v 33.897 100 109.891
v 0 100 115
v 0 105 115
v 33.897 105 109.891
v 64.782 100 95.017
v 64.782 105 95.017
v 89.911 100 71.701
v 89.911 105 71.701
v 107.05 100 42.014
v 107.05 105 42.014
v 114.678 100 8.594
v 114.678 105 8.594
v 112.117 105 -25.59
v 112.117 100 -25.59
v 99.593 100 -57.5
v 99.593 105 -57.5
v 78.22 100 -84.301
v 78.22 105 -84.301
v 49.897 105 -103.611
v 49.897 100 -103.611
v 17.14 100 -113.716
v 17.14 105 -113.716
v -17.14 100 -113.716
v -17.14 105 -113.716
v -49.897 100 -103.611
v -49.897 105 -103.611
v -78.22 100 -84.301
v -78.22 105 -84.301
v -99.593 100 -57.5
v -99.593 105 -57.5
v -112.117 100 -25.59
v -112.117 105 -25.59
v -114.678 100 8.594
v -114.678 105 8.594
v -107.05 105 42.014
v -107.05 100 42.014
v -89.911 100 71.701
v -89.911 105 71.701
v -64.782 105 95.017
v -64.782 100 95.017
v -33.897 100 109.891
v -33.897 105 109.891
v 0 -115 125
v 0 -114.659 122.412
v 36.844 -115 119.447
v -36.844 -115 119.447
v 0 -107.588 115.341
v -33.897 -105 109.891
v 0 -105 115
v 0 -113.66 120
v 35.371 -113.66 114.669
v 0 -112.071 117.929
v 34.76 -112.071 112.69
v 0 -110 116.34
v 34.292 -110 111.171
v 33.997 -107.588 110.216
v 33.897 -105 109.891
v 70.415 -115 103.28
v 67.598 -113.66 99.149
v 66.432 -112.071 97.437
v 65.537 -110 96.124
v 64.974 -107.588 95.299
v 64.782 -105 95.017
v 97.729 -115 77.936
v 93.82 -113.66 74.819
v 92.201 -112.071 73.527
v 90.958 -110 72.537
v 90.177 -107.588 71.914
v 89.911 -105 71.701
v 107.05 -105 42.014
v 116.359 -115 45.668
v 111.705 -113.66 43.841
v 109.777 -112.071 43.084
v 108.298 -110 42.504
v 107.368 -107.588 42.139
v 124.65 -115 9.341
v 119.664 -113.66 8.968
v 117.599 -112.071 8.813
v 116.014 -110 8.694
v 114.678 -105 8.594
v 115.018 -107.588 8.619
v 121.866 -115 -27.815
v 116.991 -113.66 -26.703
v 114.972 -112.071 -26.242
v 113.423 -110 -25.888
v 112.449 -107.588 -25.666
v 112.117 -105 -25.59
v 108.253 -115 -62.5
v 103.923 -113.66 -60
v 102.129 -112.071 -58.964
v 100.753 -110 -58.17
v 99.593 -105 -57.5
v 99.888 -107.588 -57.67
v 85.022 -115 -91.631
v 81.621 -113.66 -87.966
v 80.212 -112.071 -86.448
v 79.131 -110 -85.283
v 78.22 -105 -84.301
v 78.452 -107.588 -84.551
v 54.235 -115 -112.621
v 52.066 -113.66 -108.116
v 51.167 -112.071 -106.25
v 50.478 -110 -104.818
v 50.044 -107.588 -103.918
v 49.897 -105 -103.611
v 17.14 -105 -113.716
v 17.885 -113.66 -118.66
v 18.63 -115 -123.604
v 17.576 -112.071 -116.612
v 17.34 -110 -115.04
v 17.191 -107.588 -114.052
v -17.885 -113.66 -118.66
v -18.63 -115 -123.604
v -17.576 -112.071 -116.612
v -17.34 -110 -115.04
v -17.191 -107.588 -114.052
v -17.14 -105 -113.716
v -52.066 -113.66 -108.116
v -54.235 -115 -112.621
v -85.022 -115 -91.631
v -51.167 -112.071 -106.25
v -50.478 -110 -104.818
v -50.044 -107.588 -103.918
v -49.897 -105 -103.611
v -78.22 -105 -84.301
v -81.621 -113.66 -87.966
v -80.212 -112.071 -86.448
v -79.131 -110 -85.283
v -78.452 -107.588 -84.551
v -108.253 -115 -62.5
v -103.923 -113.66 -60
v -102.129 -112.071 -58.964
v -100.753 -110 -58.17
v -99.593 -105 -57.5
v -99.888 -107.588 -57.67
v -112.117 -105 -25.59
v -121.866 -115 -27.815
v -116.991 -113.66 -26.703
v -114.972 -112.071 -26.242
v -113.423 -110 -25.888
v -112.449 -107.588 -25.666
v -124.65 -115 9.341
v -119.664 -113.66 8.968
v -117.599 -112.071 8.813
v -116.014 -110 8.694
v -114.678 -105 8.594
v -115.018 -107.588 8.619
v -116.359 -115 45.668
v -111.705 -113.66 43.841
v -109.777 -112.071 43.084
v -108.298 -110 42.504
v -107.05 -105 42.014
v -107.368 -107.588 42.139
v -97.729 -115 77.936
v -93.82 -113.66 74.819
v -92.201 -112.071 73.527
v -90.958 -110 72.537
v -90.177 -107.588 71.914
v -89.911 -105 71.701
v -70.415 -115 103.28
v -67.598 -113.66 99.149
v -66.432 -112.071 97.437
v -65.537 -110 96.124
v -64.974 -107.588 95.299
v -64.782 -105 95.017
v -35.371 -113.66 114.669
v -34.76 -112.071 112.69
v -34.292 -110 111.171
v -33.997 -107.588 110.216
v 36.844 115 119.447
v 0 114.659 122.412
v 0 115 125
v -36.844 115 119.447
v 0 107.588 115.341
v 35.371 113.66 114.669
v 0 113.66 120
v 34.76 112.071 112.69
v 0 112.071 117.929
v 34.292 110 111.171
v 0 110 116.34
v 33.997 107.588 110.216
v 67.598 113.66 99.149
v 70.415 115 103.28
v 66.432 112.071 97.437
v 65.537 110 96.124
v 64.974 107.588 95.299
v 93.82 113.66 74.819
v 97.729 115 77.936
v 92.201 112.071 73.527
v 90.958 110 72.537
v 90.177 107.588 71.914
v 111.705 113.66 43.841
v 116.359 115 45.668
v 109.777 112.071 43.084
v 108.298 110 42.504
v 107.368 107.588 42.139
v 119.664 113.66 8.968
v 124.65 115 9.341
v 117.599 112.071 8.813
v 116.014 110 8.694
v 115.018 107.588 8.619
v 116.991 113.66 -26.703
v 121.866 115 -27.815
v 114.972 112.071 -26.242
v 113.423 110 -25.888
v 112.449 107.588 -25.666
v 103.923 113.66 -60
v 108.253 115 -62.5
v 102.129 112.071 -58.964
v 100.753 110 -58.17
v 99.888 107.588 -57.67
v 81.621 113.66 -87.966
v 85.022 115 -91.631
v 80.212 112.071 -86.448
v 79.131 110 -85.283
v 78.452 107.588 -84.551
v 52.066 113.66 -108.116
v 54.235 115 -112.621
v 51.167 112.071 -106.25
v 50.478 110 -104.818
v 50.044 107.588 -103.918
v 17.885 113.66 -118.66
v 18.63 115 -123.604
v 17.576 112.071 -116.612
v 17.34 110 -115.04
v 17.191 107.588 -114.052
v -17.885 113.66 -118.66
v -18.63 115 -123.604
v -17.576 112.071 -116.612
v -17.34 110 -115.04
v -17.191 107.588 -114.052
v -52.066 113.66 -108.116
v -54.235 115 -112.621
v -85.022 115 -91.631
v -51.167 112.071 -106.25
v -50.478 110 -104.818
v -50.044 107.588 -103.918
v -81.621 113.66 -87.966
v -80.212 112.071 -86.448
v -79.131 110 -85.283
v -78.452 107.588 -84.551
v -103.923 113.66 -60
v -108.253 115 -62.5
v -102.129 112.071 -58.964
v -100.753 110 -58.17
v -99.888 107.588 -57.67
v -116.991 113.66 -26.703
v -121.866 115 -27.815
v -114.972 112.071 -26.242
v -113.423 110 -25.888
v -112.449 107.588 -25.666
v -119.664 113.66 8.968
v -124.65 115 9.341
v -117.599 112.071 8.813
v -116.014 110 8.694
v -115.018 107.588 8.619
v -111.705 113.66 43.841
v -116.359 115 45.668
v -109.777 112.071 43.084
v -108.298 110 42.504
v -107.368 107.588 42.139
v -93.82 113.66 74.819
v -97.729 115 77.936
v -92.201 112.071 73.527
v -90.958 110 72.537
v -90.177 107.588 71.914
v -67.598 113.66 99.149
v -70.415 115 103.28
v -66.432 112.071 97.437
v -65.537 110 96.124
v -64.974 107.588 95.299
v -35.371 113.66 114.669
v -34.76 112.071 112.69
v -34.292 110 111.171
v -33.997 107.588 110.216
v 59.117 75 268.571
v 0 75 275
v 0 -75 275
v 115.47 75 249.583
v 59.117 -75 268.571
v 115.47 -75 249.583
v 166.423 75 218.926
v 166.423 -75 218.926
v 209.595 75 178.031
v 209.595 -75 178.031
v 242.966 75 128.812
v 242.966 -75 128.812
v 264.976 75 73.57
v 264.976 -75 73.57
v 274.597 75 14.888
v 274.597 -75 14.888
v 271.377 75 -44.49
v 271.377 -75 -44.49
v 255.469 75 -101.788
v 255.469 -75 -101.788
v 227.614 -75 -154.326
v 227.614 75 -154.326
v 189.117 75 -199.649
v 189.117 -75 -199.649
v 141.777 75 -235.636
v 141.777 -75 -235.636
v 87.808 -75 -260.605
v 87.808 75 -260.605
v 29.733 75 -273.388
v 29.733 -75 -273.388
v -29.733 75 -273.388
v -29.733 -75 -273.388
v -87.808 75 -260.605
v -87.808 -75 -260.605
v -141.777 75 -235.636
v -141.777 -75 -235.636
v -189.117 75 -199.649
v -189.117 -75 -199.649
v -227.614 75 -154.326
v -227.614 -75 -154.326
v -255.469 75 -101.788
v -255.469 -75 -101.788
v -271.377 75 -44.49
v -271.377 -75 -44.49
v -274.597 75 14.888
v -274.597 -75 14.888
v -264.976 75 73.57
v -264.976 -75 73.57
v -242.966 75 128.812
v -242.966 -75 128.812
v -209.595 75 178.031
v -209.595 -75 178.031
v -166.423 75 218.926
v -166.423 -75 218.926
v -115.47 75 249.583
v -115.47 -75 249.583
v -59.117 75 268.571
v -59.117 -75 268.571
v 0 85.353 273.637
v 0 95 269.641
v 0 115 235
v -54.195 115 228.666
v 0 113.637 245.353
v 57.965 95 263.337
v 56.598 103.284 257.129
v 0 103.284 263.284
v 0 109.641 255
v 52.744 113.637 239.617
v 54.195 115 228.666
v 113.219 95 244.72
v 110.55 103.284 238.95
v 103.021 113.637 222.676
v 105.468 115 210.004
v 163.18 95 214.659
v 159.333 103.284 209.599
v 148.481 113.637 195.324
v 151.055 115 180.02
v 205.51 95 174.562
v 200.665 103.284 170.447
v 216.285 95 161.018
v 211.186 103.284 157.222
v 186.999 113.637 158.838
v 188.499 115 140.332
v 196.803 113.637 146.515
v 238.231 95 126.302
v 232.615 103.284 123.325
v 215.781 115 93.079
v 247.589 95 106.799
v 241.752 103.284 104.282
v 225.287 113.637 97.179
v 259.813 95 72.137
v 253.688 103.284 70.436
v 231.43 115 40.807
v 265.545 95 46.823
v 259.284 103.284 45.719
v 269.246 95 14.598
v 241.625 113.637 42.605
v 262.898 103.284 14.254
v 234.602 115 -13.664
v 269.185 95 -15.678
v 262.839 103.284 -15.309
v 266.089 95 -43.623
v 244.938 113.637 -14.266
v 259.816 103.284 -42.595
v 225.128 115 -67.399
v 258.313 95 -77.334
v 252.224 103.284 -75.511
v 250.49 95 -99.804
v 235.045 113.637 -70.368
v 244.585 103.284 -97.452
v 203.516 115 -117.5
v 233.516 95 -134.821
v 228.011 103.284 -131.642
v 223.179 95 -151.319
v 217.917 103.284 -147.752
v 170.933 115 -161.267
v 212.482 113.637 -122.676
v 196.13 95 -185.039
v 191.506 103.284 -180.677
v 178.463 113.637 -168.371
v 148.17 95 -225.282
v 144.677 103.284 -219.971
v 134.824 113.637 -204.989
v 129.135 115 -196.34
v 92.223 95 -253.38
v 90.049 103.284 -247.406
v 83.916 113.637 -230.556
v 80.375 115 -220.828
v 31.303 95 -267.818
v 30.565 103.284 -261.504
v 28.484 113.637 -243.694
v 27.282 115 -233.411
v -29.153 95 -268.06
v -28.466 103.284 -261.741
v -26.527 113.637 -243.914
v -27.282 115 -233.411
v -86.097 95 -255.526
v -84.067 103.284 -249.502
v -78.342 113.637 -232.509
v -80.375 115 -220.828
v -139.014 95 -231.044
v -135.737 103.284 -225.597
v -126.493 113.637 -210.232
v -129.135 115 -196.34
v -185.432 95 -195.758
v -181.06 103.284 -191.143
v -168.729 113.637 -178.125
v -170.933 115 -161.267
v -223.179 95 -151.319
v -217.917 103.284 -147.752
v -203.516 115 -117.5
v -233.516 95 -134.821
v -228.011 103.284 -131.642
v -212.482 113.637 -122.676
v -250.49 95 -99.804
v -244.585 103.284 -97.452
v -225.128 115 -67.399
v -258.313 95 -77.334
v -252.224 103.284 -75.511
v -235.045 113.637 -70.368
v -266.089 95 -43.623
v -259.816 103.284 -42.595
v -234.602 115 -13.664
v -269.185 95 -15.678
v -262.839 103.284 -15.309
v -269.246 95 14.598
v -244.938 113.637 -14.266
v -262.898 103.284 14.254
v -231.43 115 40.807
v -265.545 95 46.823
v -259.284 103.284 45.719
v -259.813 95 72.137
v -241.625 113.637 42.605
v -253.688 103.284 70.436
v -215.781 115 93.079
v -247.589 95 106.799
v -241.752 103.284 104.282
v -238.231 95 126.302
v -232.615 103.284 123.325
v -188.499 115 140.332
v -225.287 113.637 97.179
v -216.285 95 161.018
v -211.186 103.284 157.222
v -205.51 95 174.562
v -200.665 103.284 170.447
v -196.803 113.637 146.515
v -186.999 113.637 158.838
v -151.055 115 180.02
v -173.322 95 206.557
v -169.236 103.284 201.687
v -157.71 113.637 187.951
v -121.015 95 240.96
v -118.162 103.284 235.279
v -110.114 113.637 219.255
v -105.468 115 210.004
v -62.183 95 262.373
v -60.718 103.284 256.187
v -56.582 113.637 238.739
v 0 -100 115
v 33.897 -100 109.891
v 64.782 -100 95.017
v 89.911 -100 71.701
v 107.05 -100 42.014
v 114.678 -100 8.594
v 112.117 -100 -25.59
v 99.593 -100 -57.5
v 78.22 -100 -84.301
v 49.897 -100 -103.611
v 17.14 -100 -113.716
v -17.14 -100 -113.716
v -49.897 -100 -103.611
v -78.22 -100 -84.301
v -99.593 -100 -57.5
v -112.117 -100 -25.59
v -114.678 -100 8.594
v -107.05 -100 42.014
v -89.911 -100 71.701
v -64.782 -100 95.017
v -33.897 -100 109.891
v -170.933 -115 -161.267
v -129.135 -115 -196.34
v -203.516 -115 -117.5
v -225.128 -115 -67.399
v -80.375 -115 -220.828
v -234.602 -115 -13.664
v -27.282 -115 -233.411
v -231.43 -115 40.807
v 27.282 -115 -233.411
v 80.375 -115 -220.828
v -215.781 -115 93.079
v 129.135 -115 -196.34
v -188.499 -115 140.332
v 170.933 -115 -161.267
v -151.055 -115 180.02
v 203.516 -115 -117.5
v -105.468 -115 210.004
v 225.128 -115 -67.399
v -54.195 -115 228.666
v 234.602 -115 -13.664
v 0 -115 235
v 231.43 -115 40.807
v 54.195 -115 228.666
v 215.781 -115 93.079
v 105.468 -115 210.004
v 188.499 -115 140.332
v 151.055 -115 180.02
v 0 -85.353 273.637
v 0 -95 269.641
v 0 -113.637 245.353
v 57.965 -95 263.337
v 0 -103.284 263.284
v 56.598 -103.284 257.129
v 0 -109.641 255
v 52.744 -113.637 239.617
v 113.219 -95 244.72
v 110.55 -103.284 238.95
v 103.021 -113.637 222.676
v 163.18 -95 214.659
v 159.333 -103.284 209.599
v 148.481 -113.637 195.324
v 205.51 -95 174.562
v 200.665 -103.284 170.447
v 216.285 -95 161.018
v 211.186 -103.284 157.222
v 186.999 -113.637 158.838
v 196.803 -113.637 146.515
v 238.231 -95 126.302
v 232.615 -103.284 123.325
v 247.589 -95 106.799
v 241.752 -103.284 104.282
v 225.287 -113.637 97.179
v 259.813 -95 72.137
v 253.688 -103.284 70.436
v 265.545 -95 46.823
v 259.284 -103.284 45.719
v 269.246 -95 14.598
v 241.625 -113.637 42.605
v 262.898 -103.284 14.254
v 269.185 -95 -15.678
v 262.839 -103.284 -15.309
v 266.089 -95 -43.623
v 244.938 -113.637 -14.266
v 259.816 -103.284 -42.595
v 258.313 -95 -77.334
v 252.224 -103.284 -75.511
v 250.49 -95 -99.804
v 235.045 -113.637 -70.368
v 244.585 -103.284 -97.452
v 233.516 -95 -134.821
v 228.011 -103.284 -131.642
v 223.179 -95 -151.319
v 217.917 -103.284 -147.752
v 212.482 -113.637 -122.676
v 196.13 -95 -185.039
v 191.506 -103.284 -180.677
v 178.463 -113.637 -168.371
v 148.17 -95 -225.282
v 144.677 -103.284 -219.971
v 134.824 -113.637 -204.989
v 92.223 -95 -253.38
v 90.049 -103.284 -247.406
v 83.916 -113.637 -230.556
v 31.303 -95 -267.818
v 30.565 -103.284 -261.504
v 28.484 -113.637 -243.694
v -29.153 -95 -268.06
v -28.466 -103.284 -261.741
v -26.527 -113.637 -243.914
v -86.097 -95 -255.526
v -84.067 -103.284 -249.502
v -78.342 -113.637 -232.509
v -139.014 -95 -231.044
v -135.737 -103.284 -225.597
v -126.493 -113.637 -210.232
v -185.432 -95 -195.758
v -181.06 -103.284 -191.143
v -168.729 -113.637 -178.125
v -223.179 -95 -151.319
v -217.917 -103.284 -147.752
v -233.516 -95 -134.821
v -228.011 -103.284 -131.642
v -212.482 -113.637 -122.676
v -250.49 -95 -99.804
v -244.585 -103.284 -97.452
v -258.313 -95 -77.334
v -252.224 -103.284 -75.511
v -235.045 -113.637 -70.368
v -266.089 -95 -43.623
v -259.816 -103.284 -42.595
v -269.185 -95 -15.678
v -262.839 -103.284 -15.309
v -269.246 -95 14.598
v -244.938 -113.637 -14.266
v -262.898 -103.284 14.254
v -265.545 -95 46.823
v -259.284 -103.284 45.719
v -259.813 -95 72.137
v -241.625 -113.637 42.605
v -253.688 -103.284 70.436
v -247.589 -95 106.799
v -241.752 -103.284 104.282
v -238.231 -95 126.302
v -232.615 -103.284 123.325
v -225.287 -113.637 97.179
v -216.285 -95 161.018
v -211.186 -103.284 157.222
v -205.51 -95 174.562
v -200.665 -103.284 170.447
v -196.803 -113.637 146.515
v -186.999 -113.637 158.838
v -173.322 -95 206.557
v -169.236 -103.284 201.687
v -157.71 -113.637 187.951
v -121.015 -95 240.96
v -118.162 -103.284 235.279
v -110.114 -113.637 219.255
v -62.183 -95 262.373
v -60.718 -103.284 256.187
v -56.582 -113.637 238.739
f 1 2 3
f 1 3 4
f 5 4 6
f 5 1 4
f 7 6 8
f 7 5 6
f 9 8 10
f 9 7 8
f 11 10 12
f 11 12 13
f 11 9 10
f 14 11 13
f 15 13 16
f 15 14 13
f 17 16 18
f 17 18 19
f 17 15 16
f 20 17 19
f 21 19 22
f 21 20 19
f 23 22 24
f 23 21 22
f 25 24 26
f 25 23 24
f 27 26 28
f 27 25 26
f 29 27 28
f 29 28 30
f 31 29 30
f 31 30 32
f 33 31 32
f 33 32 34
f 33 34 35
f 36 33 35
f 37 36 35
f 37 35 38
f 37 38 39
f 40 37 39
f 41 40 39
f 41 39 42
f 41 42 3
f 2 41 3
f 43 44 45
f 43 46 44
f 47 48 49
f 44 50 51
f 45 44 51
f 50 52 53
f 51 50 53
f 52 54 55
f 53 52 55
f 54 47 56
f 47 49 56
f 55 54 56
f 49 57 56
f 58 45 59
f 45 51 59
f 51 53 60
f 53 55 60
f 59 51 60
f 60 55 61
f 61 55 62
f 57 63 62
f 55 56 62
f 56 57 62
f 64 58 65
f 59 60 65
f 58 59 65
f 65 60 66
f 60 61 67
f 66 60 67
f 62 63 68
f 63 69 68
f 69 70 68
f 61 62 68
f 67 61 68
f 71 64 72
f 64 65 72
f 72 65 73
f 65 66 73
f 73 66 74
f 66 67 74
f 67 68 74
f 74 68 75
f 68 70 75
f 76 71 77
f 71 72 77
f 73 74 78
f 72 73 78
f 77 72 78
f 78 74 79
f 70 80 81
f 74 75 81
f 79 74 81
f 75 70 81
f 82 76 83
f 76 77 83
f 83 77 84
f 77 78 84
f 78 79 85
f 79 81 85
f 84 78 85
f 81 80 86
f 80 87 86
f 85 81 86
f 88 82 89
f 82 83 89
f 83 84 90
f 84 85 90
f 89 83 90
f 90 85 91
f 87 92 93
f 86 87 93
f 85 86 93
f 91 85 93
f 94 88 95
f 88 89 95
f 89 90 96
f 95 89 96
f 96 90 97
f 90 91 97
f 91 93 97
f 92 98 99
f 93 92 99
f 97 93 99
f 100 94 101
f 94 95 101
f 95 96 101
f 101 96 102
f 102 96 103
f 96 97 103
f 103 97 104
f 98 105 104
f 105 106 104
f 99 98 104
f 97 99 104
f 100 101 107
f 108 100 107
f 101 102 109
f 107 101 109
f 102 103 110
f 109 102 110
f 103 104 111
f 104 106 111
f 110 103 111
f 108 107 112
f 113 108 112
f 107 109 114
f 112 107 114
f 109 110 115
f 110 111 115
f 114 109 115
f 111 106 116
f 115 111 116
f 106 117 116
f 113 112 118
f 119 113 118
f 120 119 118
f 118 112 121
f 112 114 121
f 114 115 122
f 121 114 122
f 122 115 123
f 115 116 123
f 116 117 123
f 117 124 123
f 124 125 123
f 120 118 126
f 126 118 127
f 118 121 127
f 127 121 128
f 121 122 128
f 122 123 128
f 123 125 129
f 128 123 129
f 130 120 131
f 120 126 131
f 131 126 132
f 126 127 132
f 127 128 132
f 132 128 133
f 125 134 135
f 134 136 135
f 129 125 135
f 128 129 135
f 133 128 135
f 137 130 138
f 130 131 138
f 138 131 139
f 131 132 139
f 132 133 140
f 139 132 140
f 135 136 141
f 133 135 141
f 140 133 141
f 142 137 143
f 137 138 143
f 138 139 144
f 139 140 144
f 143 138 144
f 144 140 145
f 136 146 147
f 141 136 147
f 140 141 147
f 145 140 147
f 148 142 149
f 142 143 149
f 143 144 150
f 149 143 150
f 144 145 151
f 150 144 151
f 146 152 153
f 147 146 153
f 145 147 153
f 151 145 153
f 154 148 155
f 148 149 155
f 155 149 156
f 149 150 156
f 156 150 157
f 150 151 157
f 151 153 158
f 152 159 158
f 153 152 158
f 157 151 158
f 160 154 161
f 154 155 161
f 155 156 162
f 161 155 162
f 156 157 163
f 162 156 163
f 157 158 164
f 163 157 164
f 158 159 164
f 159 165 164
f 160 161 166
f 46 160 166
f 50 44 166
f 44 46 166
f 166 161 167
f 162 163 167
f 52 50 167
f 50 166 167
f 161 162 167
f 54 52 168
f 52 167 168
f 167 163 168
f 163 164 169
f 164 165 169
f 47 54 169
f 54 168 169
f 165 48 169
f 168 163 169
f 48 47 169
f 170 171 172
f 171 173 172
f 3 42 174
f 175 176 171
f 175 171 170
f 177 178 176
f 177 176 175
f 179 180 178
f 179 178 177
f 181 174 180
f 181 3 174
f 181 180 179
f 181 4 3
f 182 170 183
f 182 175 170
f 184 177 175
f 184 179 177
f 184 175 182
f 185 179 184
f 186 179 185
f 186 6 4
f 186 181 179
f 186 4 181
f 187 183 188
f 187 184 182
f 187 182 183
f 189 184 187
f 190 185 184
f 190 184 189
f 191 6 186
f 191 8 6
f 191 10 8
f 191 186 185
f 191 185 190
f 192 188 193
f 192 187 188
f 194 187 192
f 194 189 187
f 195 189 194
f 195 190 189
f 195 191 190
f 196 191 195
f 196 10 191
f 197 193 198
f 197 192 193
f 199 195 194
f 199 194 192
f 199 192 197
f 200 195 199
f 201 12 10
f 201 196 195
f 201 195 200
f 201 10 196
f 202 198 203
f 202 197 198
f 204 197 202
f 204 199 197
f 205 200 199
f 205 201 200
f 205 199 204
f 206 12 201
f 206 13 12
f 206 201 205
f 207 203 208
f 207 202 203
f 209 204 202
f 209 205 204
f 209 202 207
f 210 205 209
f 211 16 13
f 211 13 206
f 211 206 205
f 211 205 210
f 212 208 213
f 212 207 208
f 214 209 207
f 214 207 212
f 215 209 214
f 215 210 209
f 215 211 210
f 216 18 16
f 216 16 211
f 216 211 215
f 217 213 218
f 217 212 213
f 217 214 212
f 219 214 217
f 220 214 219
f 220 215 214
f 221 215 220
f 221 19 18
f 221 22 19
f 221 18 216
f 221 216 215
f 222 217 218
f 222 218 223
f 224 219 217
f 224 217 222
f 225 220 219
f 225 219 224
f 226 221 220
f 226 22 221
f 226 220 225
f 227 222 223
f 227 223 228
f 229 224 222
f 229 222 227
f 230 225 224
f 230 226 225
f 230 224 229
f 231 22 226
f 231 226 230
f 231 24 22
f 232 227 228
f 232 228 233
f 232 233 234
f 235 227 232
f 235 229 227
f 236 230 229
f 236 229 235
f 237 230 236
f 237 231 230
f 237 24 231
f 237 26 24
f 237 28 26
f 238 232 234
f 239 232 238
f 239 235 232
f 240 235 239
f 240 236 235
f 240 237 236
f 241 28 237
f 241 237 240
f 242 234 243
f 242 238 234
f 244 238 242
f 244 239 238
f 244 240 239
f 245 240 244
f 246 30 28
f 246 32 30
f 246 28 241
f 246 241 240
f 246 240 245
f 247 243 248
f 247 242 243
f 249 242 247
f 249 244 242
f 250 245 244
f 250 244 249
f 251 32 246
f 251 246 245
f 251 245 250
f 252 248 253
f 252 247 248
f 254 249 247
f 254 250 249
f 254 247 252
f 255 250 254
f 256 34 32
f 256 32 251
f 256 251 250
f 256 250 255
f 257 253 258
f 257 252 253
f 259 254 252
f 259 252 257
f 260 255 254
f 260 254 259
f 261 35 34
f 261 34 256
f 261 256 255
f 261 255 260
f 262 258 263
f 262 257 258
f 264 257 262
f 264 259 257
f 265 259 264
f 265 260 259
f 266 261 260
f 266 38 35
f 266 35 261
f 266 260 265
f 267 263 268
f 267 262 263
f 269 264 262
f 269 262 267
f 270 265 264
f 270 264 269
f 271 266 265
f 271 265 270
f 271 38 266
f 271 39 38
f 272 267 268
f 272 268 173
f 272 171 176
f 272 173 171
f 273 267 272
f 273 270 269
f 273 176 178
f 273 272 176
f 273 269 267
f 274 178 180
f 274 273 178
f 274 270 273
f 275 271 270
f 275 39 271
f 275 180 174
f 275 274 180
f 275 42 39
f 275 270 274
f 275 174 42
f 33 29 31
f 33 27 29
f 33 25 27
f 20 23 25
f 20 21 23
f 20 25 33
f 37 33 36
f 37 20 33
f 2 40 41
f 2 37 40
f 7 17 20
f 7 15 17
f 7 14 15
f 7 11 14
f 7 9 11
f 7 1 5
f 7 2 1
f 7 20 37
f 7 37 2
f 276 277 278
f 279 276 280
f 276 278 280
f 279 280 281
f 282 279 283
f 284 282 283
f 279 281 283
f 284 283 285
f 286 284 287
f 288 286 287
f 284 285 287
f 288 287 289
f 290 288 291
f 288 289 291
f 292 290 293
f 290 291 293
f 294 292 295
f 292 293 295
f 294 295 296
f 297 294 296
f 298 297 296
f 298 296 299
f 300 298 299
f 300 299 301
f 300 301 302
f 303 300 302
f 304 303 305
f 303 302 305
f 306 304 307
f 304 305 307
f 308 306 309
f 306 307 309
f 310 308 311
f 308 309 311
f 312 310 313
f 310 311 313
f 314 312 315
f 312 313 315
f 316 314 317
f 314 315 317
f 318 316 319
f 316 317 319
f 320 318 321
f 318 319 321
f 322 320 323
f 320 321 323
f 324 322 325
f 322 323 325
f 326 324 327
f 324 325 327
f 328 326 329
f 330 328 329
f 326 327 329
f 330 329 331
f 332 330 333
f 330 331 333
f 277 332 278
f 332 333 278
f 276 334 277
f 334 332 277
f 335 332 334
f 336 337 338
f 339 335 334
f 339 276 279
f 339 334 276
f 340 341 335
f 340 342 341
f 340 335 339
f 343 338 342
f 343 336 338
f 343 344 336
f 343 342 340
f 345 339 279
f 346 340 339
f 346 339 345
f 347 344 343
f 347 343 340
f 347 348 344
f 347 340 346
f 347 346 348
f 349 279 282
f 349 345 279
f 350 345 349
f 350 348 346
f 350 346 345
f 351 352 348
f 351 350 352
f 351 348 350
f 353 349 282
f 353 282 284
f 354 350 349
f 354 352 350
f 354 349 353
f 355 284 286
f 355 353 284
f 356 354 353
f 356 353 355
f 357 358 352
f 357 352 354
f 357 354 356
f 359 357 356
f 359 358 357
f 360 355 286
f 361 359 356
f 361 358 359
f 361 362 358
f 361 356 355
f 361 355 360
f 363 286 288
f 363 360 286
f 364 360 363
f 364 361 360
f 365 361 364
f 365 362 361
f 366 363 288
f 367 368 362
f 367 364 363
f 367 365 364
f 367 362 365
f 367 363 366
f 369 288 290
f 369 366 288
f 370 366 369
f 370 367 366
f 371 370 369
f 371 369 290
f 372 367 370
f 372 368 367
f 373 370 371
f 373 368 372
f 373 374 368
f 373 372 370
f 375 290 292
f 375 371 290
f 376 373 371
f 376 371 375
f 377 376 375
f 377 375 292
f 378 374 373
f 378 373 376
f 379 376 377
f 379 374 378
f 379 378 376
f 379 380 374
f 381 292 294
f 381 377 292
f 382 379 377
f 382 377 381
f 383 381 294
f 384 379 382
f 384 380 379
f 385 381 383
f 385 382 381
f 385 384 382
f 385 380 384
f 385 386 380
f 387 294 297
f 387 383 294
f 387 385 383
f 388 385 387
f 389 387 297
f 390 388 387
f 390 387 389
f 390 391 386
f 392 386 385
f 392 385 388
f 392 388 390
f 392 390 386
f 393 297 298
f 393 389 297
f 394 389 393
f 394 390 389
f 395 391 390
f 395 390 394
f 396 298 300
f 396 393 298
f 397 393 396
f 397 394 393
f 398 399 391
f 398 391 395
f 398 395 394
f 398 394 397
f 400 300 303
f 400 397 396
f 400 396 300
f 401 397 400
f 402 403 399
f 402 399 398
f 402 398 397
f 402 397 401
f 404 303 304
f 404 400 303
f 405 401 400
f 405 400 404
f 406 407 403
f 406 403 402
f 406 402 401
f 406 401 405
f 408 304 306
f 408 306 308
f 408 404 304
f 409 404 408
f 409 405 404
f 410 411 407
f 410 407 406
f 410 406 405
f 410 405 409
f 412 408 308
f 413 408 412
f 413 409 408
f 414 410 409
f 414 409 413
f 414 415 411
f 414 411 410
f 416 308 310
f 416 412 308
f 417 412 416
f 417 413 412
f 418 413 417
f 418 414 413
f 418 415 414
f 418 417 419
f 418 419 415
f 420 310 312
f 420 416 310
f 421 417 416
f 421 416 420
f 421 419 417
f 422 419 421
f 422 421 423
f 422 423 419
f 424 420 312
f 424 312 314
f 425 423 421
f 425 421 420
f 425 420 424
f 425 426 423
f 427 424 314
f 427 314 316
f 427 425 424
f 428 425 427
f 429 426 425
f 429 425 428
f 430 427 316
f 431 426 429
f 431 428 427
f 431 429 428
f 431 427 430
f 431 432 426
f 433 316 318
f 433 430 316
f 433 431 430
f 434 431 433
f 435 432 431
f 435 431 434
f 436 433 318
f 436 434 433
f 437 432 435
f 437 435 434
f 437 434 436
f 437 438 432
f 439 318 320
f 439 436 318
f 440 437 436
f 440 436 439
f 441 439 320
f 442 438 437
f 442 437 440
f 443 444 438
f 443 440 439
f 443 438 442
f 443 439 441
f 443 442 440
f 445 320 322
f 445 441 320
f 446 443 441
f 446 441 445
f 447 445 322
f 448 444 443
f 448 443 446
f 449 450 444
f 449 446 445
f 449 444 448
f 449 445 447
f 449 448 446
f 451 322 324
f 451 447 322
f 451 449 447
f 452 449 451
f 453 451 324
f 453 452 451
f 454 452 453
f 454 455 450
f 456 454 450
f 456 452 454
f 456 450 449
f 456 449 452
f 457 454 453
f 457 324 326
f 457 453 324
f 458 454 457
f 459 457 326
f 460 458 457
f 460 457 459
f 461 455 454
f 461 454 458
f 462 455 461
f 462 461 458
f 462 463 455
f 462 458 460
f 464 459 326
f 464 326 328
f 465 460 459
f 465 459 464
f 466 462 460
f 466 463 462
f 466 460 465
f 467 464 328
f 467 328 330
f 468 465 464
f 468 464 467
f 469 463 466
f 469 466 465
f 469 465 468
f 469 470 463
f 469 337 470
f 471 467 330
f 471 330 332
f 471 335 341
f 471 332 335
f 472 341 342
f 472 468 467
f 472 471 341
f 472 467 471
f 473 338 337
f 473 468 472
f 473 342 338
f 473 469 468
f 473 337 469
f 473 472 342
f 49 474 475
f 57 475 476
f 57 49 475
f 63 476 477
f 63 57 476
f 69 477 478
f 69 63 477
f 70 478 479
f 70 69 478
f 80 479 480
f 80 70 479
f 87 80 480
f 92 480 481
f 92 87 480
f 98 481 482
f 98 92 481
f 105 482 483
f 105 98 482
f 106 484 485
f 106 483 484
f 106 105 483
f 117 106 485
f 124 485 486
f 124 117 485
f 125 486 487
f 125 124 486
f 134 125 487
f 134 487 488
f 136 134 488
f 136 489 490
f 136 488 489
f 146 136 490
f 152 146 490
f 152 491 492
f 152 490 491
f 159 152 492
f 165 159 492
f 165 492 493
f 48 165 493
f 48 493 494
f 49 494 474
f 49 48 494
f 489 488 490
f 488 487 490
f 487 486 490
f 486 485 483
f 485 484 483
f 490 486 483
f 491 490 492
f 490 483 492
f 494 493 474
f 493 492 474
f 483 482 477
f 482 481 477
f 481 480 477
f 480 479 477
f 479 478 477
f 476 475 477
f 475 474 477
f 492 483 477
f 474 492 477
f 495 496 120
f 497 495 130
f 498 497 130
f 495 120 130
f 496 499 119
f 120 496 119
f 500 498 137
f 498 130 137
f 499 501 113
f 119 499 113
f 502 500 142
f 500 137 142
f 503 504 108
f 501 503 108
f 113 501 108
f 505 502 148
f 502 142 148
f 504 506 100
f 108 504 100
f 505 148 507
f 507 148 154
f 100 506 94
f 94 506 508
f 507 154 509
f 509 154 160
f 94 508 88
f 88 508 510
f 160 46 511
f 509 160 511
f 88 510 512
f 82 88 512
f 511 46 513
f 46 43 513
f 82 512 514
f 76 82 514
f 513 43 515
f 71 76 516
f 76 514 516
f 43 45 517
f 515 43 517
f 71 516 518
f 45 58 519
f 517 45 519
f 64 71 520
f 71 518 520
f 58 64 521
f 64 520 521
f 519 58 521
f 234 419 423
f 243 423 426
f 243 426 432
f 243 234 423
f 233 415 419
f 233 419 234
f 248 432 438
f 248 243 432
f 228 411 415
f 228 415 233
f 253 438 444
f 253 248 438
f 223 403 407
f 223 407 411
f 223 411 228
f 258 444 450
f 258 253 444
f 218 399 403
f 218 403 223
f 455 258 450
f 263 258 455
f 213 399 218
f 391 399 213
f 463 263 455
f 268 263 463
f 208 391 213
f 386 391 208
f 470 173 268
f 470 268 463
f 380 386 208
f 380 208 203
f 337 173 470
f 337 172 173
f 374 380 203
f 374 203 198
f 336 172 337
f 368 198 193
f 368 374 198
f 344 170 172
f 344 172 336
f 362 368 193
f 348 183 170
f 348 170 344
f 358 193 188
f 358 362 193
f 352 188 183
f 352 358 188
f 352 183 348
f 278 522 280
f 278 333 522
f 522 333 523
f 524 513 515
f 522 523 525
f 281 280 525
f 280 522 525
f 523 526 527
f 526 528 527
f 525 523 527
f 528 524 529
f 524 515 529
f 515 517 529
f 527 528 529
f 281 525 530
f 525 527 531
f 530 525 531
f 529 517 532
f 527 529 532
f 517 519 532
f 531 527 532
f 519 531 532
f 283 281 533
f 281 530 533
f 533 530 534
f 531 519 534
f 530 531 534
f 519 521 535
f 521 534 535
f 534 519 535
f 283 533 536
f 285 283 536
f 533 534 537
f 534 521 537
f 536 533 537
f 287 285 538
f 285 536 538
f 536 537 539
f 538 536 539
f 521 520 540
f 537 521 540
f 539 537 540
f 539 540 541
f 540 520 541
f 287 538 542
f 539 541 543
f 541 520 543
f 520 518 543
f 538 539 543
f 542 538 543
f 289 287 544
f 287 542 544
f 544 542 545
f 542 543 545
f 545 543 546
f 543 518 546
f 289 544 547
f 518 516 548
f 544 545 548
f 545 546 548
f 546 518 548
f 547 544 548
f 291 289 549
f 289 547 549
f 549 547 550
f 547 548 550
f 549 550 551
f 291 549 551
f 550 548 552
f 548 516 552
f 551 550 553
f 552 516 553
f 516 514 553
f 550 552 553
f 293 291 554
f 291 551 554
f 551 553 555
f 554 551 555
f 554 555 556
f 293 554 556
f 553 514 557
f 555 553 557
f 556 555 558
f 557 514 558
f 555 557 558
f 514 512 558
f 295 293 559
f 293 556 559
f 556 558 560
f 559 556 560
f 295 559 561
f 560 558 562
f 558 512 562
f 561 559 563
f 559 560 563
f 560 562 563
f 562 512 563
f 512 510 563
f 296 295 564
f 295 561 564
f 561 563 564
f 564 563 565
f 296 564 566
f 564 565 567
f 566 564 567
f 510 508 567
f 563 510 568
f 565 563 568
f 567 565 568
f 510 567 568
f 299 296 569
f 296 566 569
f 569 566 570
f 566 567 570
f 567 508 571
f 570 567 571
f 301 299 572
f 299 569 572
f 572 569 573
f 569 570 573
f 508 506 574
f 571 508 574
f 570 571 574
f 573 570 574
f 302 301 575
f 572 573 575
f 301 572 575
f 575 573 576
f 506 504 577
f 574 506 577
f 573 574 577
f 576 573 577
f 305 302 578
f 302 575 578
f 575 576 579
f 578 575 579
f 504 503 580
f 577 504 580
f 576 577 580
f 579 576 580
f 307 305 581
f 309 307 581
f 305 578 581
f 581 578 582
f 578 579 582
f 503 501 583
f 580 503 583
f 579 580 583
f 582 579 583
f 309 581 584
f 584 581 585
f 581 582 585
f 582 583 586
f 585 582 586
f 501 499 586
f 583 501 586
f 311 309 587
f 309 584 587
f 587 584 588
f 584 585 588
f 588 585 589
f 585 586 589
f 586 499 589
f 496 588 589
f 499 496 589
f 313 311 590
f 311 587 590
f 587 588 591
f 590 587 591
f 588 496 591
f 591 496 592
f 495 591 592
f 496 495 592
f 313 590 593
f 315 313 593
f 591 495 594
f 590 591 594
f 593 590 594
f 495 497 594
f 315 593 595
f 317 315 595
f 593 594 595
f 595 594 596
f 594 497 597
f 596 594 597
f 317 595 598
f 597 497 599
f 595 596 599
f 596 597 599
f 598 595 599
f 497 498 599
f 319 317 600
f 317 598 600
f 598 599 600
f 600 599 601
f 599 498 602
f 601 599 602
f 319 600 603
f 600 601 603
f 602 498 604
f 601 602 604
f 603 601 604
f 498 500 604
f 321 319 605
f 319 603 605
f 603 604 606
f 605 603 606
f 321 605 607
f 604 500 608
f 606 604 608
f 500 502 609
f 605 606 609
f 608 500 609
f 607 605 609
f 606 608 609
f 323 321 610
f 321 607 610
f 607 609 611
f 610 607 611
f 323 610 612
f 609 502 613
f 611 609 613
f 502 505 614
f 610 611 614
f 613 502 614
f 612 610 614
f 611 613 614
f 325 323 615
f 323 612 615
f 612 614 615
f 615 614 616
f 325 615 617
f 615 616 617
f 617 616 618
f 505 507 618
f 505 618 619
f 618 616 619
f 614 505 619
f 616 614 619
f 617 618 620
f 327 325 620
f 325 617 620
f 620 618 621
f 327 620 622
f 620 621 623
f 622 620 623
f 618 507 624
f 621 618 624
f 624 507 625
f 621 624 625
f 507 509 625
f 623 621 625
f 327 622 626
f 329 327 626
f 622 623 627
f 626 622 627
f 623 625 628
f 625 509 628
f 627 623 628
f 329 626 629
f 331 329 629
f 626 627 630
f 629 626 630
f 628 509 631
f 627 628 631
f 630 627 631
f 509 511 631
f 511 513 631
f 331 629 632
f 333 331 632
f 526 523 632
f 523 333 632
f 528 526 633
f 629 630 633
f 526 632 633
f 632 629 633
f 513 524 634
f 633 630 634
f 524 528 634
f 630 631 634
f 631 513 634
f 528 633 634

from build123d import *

# Parameters (mm, degrees)
SALIENTE_EXTRUIR1_DEPTH      = 100
SALIENTE_EXTRUIR1_DEPTH_BACK = 100
CROQUIS1_R                   = 120
SALIENTE_EXTRUIR4_DEPTH      = 115
SALIENTE_EXTRUIR4_DEPTH_BACK = 115
CROQUIS3_R                   = 275
CROQUIS3_R_2                 = 115
REDONDEO1_R                  = 40
REDONDEO2_R                  = 10
REDONDEO3_R                  = 10


with BuildPart() as part:
    # Croquis1 → Saliente-Extruir1 (new, two sides: drawn at the far end of the back side and taken through both)
    with BuildSketch(Plane(origin=(0, 0, 0), x_dir=(1, 0, 0), z_dir=(0, 1, 0)).offset(-SALIENTE_EXTRUIR1_DEPTH_BACK)):
        Circle(CROQUIS1_R)
    extrude(amount=SALIENTE_EXTRUIR1_DEPTH + SALIENTE_EXTRUIR1_DEPTH_BACK)

    # Croquis3 → Saliente-Extruir4 (add, two sides: drawn at the far end of the back side and taken through both)
    with BuildSketch(Plane(origin=(0, 0, 0), x_dir=(1, 0, 0), z_dir=(0, 1, 0)).offset(-SALIENTE_EXTRUIR4_DEPTH_BACK)):
        Circle(CROQUIS3_R)
        Circle(CROQUIS3_R_2, mode=Mode.SUBTRACT)
    extrude(amount=SALIENTE_EXTRUIR4_DEPTH + SALIENTE_EXTRUIR4_DEPTH_BACK)

    # Redondeo1
    redondeo1_edges = [part.edges().sort_by_distance(p)[0] for p in [
        (-275, 115, 0),
        (-275, -115, 0),
    ]]
    fillet(redondeo1_edges, radius=REDONDEO1_R)

    # Redondeo2
    redondeo2_edges = [part.edges().sort_by_distance(p)[0] for p in [
        (-115, -115, 0),
    ]]
    fillet(redondeo2_edges, radius=REDONDEO2_R)

    # Redondeo3
    redondeo3_edges = [part.edges().sort_by_distance(p)[0] for p in [
        (-115, 115, 0),
    ]]
    fillet(redondeo3_edges, radius=REDONDEO3_R)


solid = part.part
